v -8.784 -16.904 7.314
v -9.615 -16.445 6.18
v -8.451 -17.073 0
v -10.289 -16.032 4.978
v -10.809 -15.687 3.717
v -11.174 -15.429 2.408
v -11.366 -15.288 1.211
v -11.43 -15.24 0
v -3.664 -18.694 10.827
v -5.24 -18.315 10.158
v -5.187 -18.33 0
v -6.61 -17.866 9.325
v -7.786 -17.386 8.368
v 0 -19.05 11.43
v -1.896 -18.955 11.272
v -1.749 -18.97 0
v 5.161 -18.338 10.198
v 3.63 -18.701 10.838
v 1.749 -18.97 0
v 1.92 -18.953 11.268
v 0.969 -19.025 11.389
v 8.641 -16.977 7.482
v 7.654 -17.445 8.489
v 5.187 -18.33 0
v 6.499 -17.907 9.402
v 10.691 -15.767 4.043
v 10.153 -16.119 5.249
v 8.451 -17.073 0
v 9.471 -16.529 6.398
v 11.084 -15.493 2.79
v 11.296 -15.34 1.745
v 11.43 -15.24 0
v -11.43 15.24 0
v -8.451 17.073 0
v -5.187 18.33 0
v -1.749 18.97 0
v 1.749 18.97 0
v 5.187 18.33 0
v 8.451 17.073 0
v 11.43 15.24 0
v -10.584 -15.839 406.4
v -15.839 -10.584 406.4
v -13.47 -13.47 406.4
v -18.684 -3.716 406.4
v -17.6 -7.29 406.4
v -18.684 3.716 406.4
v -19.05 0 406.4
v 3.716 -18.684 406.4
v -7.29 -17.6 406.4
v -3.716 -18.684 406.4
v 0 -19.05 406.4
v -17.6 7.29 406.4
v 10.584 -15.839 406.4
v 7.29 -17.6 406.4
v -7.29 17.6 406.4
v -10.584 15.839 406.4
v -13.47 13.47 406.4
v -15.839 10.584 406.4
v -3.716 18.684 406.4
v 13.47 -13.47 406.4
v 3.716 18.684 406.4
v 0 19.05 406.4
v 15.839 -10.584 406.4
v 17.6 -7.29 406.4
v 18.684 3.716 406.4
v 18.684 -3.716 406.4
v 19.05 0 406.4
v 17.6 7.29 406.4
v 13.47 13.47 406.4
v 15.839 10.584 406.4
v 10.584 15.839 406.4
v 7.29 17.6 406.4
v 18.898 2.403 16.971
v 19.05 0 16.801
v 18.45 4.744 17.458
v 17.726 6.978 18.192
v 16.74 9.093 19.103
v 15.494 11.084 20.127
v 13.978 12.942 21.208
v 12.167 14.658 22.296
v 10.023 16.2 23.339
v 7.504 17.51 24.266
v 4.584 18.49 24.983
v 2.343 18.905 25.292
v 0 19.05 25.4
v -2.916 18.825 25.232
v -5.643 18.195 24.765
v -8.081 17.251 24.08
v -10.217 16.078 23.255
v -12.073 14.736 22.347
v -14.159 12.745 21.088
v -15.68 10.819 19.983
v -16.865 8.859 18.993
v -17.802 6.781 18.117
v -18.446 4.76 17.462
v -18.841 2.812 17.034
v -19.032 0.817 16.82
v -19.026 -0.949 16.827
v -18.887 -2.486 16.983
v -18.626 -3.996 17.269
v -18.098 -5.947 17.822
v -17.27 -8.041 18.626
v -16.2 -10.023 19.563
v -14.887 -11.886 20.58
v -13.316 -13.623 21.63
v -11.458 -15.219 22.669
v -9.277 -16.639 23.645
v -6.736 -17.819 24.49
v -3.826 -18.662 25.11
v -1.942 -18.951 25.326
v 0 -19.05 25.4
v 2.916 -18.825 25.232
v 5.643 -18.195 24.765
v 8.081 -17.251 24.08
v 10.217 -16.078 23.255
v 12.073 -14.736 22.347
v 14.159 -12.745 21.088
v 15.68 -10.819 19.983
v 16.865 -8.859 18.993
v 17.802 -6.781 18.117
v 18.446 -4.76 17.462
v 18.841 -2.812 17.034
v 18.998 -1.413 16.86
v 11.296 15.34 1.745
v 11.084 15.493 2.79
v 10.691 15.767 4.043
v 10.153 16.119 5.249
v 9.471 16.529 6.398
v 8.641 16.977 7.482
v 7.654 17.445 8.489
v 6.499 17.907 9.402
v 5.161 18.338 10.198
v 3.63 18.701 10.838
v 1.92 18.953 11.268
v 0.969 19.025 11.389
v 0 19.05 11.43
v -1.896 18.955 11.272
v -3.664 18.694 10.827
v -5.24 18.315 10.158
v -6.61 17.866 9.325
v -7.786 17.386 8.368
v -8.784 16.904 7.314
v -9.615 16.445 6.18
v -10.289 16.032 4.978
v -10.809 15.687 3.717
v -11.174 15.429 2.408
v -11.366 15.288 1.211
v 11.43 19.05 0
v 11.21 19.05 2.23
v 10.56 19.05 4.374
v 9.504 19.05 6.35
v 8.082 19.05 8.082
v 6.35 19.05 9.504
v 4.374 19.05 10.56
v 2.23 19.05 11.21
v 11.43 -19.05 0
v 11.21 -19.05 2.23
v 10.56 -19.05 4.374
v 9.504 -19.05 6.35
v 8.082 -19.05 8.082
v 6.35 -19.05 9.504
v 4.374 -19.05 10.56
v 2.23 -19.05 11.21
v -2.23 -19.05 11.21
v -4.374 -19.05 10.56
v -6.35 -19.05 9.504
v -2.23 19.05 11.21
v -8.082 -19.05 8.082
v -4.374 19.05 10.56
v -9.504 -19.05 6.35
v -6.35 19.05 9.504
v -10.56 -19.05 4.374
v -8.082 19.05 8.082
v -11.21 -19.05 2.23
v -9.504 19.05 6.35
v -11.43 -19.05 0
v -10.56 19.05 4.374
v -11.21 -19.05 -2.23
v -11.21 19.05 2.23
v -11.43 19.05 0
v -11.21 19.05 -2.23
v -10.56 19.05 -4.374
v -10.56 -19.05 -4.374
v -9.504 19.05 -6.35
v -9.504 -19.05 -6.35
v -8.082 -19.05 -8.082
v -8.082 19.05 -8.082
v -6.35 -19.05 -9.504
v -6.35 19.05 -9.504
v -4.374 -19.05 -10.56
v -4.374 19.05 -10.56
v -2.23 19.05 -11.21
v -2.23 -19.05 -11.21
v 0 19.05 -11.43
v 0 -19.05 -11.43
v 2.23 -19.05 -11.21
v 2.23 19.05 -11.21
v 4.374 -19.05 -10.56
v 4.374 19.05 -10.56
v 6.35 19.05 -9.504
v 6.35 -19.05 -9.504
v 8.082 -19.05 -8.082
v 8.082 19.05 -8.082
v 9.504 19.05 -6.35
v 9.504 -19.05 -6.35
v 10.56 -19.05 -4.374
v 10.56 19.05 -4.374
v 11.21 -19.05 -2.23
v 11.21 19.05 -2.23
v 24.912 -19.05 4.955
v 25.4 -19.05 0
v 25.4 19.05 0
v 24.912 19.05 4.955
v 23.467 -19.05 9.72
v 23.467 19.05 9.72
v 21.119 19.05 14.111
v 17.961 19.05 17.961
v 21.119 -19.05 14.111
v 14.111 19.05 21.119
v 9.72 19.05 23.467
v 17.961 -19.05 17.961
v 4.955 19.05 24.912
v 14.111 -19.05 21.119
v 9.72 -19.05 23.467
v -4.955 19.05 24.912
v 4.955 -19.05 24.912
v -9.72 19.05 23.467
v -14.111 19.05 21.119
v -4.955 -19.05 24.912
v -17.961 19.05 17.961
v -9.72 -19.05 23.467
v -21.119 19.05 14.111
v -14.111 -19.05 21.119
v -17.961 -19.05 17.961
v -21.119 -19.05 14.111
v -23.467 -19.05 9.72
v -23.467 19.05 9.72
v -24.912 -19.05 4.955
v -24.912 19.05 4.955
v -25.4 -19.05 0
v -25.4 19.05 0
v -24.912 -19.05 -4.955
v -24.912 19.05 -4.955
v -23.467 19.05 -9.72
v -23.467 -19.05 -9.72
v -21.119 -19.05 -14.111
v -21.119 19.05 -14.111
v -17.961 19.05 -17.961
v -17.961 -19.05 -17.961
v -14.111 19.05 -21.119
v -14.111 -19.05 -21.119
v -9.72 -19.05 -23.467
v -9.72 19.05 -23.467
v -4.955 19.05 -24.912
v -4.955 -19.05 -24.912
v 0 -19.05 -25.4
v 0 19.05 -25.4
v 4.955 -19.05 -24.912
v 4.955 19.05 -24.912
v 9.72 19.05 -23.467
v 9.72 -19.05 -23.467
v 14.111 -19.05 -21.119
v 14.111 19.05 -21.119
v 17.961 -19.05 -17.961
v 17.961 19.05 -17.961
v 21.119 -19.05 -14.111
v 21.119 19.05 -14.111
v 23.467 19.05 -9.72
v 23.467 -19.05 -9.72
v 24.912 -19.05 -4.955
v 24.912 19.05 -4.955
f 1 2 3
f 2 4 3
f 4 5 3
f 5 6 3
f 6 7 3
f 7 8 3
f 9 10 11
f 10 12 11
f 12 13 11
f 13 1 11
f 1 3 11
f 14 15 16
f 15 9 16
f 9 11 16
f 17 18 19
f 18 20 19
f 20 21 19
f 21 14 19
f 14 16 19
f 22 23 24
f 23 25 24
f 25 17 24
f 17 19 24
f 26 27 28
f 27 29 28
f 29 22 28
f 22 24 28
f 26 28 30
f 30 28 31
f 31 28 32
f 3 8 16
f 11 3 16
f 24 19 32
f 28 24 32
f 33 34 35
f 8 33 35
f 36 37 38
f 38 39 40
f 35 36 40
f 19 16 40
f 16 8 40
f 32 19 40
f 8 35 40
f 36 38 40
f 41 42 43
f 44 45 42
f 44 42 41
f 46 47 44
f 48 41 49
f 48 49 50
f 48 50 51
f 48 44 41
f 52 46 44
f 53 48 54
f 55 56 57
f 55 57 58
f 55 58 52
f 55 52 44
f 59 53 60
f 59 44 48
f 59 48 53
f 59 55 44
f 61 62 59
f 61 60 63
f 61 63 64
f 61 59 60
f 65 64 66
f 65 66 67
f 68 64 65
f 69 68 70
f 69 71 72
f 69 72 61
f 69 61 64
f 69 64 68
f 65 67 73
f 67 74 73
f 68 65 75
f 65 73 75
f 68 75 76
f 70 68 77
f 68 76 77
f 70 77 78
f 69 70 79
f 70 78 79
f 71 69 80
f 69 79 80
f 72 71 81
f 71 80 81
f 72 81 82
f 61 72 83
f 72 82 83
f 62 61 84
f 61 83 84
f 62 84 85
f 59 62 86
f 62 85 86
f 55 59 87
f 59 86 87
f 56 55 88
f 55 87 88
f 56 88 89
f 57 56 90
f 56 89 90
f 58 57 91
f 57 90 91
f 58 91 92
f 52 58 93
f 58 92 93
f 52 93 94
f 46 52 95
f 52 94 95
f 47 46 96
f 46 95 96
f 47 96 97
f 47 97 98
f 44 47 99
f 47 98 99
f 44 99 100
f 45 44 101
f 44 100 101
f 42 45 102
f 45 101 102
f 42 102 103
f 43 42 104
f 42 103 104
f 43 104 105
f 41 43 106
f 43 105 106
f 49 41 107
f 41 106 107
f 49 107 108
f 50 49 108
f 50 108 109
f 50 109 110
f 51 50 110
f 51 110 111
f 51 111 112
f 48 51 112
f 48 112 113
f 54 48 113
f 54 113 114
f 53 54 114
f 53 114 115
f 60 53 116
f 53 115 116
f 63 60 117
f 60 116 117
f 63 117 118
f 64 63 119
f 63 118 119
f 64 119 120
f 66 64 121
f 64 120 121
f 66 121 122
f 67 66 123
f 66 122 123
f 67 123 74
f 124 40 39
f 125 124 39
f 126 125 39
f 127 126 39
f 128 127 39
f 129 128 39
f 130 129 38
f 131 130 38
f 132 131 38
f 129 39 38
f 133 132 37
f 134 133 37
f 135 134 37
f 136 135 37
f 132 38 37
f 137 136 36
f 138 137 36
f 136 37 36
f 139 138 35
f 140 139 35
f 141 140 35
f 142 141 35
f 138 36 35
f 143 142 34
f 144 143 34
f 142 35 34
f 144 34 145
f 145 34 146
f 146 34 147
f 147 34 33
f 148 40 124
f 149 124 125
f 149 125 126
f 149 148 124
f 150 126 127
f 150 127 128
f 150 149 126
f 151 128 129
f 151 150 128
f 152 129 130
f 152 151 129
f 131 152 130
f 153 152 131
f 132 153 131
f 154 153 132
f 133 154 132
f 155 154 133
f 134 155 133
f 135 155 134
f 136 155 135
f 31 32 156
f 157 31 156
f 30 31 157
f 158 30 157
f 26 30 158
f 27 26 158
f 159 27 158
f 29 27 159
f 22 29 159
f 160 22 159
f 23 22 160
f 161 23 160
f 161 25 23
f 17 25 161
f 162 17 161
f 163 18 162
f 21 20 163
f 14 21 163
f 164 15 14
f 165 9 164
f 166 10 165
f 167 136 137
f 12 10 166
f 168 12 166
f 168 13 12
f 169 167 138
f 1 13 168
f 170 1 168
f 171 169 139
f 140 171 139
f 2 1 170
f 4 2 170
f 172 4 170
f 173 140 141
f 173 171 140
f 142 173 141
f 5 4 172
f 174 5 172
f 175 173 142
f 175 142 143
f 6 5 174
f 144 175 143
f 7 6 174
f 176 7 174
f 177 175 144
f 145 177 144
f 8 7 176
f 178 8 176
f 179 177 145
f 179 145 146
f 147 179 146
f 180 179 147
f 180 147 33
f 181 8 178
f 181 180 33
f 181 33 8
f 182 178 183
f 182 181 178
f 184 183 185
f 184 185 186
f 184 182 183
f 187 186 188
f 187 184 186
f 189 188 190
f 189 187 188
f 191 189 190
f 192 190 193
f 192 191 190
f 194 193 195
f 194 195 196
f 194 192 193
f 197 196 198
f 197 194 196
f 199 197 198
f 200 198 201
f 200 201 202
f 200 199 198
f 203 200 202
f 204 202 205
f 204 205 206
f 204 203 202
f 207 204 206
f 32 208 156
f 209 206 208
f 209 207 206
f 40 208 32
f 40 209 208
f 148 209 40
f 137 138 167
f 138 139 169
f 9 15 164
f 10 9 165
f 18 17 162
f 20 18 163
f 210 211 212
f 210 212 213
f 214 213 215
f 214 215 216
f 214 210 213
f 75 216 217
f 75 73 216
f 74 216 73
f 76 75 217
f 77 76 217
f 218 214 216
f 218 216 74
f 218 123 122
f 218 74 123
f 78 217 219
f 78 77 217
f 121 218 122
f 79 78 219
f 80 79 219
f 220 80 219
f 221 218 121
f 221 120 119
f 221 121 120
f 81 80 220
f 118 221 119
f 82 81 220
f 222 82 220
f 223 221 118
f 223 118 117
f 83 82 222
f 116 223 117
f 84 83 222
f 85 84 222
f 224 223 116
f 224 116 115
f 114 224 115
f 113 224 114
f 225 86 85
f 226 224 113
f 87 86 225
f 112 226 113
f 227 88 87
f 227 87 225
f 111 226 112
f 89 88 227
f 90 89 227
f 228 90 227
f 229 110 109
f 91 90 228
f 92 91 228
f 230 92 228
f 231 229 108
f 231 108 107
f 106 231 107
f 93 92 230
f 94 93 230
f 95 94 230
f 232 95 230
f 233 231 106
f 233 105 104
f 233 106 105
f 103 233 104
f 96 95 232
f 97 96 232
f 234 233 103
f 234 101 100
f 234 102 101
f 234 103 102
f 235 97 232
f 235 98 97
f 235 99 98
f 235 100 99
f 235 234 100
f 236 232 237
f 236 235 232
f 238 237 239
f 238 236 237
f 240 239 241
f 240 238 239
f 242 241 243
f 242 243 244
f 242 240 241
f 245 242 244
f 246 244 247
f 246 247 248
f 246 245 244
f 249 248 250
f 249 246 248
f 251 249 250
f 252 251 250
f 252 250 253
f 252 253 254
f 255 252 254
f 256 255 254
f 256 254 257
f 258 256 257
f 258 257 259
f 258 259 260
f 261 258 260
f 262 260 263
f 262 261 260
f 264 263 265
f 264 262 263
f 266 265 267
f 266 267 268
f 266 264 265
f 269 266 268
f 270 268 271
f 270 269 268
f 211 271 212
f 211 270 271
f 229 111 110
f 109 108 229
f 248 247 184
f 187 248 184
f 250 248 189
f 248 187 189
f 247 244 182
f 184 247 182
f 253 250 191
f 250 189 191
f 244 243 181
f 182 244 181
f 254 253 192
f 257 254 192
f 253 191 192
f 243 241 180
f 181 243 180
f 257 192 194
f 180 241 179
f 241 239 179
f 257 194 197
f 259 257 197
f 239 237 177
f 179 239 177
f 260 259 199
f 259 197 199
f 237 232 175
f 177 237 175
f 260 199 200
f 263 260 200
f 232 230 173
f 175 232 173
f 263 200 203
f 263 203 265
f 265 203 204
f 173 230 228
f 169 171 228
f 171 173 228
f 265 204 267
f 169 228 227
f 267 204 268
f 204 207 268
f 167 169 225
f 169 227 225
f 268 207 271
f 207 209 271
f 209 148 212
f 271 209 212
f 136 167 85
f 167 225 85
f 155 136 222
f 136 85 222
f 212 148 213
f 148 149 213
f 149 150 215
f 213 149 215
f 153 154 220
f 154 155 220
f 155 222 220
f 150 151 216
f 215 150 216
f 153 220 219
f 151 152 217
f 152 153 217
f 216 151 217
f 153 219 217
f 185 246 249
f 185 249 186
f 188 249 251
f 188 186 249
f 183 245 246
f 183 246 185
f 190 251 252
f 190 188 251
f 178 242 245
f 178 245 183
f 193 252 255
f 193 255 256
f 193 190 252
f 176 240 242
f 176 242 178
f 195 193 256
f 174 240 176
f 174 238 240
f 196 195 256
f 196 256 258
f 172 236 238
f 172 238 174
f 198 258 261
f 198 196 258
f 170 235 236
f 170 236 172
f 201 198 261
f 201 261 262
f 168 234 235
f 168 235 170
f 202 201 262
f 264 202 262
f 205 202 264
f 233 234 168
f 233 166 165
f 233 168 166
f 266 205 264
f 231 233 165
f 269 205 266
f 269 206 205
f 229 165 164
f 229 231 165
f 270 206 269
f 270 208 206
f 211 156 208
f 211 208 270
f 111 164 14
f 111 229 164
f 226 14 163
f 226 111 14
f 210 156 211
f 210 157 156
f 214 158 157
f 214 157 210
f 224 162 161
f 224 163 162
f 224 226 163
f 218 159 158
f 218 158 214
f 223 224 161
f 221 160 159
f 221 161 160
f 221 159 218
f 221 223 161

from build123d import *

# Parameters (mm, degrees)
F1_R     = 25.4
F1_R_2   = 11.43
F2_DEPTH = 19.05
F0_R     = 19.05
F3_DEPTH = 254
F4_R     = 38.1
F4_R_2   = 19.05
F5_DEPTH = 6.35
F6_DEPTH = 152.4
F7_DEPTH = 25.4


with BuildPart() as f2:
    # F1 (on Front) → F2 (new body, symmetric)
    with BuildSketch(Plane.XZ):
        Circle(F1_R)
        Circle(F1_R_2, mode=Mode.SUBTRACT)
    extrude(amount=F2_DEPTH, both=True)

    # F0 (on Top) → F3 (join)
    with BuildSketch(Plane.XY):
        Circle(F0_R)
    extrude(amount=F3_DEPTH)

    # F6 (add): a face of the model
    f6_faces = [f2.faces().sort_by_distance(p)[0] for p in [
        (0, 0, 254),
    ]]


with BuildPart() as f5:
    # F4 (on face) → F5 (new body)
    with BuildSketch(Plane.XY.offset(254)):
        Circle(F4_R)
        Circle(F4_R_2, mode=Mode.SUBTRACT)
    extrude(amount=F5_DEPTH)


with BuildPart() as f2_1:
    add(f2.part)

    add(f5.part)  # F6 merges F5
    extrude(f6_faces, amount=F6_DEPTH)

    # F7 (cut): a face of the model
    f7_faces = [f2_1.faces().sort_by_distance(p)[0] for p in [
        (-37.0223692655, 0, 260.35),
    ]]
    extrude(f7_faces, amount=-F7_DEPTH, mode=Mode.SUBTRACT)


solid = f2_1.part
